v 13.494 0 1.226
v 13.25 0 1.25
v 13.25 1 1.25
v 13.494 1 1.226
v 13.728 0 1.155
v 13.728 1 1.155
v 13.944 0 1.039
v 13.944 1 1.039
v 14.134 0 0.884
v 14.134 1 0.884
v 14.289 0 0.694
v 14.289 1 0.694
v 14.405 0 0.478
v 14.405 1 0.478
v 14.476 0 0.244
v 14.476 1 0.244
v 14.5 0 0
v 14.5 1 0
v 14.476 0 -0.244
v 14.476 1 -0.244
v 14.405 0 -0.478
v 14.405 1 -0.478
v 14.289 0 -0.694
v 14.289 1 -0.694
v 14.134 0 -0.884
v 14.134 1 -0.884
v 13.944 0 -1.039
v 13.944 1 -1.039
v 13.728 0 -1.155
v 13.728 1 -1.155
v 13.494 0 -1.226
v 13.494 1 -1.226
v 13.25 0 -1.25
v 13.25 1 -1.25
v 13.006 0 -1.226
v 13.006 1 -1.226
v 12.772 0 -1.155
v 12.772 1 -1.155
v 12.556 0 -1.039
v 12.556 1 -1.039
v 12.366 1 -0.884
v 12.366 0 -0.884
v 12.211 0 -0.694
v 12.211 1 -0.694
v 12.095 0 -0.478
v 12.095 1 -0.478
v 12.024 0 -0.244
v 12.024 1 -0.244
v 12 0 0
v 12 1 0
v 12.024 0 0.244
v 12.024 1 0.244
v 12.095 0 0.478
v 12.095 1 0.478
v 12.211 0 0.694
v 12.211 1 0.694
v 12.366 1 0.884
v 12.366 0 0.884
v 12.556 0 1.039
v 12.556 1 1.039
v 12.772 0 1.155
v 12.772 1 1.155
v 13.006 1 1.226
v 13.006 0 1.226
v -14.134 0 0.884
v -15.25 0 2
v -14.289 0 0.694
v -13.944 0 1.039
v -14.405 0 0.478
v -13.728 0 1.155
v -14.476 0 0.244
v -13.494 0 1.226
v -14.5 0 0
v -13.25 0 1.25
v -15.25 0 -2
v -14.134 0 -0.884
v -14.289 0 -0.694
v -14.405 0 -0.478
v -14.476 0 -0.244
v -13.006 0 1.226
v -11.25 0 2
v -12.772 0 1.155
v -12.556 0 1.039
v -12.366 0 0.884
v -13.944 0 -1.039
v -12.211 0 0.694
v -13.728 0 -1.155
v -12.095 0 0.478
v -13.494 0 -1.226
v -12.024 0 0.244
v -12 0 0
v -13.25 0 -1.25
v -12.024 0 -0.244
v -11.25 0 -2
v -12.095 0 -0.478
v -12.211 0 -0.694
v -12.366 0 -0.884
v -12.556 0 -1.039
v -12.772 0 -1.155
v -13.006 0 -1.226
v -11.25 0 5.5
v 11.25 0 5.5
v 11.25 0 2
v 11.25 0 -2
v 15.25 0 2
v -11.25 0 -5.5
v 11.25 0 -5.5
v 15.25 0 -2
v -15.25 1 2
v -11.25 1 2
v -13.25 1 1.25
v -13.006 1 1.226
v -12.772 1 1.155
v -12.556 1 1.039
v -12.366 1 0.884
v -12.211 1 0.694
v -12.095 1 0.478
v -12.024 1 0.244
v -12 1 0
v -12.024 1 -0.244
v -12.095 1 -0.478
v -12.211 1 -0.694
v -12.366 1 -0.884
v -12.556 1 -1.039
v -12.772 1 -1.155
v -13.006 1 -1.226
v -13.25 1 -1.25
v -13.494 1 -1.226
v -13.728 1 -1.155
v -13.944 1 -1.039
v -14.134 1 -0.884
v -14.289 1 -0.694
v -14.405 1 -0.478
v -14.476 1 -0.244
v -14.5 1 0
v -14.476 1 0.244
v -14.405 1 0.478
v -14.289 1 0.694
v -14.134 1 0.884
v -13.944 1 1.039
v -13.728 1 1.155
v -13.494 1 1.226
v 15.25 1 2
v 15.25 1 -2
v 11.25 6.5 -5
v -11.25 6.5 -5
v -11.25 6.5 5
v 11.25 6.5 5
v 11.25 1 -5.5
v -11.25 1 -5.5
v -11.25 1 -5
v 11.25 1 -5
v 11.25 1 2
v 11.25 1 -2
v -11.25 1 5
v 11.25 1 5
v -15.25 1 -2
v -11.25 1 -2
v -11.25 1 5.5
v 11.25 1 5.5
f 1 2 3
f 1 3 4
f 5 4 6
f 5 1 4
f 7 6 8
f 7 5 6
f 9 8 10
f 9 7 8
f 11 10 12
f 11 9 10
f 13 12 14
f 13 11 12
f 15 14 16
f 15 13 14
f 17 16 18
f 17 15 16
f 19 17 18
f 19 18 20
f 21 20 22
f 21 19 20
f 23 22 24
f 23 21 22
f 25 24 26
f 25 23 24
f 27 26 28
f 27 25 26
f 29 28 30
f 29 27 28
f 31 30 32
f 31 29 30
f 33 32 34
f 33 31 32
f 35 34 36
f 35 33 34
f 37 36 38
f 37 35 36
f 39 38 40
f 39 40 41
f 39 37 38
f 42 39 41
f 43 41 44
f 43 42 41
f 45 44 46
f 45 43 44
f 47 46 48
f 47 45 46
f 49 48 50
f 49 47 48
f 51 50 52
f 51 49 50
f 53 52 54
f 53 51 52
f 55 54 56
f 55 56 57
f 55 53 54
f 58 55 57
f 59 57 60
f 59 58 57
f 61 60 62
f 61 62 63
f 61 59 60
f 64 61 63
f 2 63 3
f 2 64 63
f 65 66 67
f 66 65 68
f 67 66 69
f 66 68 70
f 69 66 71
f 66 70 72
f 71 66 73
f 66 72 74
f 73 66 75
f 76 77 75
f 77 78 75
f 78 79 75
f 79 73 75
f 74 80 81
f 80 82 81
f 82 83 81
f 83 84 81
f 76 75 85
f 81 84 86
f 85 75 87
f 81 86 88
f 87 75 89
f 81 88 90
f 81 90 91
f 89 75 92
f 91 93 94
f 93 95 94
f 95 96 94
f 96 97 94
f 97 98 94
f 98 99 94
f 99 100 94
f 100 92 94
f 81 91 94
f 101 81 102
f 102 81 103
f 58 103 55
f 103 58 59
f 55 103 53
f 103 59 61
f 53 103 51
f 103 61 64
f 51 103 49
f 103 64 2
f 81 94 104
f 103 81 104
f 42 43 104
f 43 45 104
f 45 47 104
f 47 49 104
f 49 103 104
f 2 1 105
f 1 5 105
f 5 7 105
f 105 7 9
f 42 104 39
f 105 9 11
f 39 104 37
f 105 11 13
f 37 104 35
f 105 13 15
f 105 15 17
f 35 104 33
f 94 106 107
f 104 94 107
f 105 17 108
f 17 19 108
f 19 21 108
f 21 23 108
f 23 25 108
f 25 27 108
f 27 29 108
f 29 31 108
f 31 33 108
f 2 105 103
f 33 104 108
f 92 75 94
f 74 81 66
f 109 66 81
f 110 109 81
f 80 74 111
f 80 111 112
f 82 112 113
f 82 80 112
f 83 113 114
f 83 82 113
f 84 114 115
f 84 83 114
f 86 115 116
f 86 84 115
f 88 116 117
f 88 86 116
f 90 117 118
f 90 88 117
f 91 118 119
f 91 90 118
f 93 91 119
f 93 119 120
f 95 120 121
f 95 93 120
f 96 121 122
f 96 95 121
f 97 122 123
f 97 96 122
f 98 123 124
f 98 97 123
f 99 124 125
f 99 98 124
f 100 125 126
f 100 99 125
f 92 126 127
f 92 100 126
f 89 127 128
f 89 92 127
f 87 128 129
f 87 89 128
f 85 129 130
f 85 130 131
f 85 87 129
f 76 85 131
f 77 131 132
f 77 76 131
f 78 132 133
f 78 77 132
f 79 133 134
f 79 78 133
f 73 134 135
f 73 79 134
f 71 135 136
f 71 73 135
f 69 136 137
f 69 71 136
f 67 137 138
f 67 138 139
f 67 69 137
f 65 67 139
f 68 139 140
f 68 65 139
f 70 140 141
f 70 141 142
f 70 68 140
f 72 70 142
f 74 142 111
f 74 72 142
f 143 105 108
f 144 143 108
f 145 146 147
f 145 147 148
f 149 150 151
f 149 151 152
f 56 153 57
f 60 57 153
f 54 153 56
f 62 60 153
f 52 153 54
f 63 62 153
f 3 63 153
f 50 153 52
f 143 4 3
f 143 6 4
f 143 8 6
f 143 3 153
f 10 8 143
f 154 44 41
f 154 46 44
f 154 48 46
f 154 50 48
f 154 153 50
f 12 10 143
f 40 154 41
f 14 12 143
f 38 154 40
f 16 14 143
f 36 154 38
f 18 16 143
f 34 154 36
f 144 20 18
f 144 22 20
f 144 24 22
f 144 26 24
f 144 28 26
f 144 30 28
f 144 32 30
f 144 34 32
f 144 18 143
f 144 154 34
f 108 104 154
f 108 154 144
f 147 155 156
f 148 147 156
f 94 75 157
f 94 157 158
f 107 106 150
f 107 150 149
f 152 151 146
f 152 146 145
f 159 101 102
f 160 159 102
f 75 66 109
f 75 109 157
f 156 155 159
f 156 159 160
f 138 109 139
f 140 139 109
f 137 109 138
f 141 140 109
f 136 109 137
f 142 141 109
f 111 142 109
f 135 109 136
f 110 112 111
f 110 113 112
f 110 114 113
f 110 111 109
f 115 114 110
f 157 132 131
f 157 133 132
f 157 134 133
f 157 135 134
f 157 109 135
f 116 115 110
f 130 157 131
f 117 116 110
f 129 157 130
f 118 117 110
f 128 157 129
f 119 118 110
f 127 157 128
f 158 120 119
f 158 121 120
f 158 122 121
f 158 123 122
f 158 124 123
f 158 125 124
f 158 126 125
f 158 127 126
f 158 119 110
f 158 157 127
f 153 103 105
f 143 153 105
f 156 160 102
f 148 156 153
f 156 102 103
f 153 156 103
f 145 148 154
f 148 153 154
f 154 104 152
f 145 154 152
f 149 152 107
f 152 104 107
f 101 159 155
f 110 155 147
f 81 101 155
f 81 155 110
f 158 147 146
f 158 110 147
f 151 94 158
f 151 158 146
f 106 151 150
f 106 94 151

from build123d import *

# Parameters (mm, degrees)
SKETCH_1_W      = 22.5
SKETCH_1_H      = 11
SKETCH_1_W_2    = 4
SKETCH_1_H_2    = 4
SKETCH_1_R      = 1.25
EXTRUDE_1_DEPTH = 1
SKETCH_2_W      = 22.5
SKETCH_2_H      = 10
EXTRUDE_2_DEPTH = 5.5


with BuildPart() as part:
    # Эскиз1 → Бобышка-Вытянуть1 (new body)
    # profile 1 of 3: a face of its own
    with BuildSketch(Plane(origin=(0, 0, 0), x_dir=(1, 0, 0), z_dir=(0, 1, 0))):
        Rectangle(SKETCH_1_W, SKETCH_1_H)
    # profile 2 of 3: a face of its own
    with BuildSketch(Plane(origin=(0, 0, 0), x_dir=(1, 0, 0), z_dir=(0, 1, 0))):
        with Locations((-13.25, 0)):
            Rectangle(SKETCH_1_W_2, SKETCH_1_H_2)
        with Locations(Location((-13.25, 0, 0), (0, 0, 270))):
            Circle(SKETCH_1_R, mode=Mode.SUBTRACT)
    # profile 3 of 3: a face of its own
    with BuildSketch(Plane(origin=(0, 0, 0), x_dir=(1, 0, 0), z_dir=(0, 1, 0))):
        with Locations((13.25, 0)):
            Rectangle(SKETCH_1_W_2, SKETCH_1_H_2)
        with Locations(Location((13.25, 0, 0), (0, 0, 270))):
            Circle(SKETCH_1_R, mode=Mode.SUBTRACT)
    extrude(amount=EXTRUDE_1_DEPTH)

    # Эскиз2 → Бобышка-Вытянуть2 (add)
    with BuildSketch(Plane(origin=(0, 1, 0), x_dir=(1, 0, 0), z_dir=(0, 1, 0))):
        Rectangle(SKETCH_2_W, SKETCH_2_H)
    extrude(amount=EXTRUDE_2_DEPTH)


solid = part.part
